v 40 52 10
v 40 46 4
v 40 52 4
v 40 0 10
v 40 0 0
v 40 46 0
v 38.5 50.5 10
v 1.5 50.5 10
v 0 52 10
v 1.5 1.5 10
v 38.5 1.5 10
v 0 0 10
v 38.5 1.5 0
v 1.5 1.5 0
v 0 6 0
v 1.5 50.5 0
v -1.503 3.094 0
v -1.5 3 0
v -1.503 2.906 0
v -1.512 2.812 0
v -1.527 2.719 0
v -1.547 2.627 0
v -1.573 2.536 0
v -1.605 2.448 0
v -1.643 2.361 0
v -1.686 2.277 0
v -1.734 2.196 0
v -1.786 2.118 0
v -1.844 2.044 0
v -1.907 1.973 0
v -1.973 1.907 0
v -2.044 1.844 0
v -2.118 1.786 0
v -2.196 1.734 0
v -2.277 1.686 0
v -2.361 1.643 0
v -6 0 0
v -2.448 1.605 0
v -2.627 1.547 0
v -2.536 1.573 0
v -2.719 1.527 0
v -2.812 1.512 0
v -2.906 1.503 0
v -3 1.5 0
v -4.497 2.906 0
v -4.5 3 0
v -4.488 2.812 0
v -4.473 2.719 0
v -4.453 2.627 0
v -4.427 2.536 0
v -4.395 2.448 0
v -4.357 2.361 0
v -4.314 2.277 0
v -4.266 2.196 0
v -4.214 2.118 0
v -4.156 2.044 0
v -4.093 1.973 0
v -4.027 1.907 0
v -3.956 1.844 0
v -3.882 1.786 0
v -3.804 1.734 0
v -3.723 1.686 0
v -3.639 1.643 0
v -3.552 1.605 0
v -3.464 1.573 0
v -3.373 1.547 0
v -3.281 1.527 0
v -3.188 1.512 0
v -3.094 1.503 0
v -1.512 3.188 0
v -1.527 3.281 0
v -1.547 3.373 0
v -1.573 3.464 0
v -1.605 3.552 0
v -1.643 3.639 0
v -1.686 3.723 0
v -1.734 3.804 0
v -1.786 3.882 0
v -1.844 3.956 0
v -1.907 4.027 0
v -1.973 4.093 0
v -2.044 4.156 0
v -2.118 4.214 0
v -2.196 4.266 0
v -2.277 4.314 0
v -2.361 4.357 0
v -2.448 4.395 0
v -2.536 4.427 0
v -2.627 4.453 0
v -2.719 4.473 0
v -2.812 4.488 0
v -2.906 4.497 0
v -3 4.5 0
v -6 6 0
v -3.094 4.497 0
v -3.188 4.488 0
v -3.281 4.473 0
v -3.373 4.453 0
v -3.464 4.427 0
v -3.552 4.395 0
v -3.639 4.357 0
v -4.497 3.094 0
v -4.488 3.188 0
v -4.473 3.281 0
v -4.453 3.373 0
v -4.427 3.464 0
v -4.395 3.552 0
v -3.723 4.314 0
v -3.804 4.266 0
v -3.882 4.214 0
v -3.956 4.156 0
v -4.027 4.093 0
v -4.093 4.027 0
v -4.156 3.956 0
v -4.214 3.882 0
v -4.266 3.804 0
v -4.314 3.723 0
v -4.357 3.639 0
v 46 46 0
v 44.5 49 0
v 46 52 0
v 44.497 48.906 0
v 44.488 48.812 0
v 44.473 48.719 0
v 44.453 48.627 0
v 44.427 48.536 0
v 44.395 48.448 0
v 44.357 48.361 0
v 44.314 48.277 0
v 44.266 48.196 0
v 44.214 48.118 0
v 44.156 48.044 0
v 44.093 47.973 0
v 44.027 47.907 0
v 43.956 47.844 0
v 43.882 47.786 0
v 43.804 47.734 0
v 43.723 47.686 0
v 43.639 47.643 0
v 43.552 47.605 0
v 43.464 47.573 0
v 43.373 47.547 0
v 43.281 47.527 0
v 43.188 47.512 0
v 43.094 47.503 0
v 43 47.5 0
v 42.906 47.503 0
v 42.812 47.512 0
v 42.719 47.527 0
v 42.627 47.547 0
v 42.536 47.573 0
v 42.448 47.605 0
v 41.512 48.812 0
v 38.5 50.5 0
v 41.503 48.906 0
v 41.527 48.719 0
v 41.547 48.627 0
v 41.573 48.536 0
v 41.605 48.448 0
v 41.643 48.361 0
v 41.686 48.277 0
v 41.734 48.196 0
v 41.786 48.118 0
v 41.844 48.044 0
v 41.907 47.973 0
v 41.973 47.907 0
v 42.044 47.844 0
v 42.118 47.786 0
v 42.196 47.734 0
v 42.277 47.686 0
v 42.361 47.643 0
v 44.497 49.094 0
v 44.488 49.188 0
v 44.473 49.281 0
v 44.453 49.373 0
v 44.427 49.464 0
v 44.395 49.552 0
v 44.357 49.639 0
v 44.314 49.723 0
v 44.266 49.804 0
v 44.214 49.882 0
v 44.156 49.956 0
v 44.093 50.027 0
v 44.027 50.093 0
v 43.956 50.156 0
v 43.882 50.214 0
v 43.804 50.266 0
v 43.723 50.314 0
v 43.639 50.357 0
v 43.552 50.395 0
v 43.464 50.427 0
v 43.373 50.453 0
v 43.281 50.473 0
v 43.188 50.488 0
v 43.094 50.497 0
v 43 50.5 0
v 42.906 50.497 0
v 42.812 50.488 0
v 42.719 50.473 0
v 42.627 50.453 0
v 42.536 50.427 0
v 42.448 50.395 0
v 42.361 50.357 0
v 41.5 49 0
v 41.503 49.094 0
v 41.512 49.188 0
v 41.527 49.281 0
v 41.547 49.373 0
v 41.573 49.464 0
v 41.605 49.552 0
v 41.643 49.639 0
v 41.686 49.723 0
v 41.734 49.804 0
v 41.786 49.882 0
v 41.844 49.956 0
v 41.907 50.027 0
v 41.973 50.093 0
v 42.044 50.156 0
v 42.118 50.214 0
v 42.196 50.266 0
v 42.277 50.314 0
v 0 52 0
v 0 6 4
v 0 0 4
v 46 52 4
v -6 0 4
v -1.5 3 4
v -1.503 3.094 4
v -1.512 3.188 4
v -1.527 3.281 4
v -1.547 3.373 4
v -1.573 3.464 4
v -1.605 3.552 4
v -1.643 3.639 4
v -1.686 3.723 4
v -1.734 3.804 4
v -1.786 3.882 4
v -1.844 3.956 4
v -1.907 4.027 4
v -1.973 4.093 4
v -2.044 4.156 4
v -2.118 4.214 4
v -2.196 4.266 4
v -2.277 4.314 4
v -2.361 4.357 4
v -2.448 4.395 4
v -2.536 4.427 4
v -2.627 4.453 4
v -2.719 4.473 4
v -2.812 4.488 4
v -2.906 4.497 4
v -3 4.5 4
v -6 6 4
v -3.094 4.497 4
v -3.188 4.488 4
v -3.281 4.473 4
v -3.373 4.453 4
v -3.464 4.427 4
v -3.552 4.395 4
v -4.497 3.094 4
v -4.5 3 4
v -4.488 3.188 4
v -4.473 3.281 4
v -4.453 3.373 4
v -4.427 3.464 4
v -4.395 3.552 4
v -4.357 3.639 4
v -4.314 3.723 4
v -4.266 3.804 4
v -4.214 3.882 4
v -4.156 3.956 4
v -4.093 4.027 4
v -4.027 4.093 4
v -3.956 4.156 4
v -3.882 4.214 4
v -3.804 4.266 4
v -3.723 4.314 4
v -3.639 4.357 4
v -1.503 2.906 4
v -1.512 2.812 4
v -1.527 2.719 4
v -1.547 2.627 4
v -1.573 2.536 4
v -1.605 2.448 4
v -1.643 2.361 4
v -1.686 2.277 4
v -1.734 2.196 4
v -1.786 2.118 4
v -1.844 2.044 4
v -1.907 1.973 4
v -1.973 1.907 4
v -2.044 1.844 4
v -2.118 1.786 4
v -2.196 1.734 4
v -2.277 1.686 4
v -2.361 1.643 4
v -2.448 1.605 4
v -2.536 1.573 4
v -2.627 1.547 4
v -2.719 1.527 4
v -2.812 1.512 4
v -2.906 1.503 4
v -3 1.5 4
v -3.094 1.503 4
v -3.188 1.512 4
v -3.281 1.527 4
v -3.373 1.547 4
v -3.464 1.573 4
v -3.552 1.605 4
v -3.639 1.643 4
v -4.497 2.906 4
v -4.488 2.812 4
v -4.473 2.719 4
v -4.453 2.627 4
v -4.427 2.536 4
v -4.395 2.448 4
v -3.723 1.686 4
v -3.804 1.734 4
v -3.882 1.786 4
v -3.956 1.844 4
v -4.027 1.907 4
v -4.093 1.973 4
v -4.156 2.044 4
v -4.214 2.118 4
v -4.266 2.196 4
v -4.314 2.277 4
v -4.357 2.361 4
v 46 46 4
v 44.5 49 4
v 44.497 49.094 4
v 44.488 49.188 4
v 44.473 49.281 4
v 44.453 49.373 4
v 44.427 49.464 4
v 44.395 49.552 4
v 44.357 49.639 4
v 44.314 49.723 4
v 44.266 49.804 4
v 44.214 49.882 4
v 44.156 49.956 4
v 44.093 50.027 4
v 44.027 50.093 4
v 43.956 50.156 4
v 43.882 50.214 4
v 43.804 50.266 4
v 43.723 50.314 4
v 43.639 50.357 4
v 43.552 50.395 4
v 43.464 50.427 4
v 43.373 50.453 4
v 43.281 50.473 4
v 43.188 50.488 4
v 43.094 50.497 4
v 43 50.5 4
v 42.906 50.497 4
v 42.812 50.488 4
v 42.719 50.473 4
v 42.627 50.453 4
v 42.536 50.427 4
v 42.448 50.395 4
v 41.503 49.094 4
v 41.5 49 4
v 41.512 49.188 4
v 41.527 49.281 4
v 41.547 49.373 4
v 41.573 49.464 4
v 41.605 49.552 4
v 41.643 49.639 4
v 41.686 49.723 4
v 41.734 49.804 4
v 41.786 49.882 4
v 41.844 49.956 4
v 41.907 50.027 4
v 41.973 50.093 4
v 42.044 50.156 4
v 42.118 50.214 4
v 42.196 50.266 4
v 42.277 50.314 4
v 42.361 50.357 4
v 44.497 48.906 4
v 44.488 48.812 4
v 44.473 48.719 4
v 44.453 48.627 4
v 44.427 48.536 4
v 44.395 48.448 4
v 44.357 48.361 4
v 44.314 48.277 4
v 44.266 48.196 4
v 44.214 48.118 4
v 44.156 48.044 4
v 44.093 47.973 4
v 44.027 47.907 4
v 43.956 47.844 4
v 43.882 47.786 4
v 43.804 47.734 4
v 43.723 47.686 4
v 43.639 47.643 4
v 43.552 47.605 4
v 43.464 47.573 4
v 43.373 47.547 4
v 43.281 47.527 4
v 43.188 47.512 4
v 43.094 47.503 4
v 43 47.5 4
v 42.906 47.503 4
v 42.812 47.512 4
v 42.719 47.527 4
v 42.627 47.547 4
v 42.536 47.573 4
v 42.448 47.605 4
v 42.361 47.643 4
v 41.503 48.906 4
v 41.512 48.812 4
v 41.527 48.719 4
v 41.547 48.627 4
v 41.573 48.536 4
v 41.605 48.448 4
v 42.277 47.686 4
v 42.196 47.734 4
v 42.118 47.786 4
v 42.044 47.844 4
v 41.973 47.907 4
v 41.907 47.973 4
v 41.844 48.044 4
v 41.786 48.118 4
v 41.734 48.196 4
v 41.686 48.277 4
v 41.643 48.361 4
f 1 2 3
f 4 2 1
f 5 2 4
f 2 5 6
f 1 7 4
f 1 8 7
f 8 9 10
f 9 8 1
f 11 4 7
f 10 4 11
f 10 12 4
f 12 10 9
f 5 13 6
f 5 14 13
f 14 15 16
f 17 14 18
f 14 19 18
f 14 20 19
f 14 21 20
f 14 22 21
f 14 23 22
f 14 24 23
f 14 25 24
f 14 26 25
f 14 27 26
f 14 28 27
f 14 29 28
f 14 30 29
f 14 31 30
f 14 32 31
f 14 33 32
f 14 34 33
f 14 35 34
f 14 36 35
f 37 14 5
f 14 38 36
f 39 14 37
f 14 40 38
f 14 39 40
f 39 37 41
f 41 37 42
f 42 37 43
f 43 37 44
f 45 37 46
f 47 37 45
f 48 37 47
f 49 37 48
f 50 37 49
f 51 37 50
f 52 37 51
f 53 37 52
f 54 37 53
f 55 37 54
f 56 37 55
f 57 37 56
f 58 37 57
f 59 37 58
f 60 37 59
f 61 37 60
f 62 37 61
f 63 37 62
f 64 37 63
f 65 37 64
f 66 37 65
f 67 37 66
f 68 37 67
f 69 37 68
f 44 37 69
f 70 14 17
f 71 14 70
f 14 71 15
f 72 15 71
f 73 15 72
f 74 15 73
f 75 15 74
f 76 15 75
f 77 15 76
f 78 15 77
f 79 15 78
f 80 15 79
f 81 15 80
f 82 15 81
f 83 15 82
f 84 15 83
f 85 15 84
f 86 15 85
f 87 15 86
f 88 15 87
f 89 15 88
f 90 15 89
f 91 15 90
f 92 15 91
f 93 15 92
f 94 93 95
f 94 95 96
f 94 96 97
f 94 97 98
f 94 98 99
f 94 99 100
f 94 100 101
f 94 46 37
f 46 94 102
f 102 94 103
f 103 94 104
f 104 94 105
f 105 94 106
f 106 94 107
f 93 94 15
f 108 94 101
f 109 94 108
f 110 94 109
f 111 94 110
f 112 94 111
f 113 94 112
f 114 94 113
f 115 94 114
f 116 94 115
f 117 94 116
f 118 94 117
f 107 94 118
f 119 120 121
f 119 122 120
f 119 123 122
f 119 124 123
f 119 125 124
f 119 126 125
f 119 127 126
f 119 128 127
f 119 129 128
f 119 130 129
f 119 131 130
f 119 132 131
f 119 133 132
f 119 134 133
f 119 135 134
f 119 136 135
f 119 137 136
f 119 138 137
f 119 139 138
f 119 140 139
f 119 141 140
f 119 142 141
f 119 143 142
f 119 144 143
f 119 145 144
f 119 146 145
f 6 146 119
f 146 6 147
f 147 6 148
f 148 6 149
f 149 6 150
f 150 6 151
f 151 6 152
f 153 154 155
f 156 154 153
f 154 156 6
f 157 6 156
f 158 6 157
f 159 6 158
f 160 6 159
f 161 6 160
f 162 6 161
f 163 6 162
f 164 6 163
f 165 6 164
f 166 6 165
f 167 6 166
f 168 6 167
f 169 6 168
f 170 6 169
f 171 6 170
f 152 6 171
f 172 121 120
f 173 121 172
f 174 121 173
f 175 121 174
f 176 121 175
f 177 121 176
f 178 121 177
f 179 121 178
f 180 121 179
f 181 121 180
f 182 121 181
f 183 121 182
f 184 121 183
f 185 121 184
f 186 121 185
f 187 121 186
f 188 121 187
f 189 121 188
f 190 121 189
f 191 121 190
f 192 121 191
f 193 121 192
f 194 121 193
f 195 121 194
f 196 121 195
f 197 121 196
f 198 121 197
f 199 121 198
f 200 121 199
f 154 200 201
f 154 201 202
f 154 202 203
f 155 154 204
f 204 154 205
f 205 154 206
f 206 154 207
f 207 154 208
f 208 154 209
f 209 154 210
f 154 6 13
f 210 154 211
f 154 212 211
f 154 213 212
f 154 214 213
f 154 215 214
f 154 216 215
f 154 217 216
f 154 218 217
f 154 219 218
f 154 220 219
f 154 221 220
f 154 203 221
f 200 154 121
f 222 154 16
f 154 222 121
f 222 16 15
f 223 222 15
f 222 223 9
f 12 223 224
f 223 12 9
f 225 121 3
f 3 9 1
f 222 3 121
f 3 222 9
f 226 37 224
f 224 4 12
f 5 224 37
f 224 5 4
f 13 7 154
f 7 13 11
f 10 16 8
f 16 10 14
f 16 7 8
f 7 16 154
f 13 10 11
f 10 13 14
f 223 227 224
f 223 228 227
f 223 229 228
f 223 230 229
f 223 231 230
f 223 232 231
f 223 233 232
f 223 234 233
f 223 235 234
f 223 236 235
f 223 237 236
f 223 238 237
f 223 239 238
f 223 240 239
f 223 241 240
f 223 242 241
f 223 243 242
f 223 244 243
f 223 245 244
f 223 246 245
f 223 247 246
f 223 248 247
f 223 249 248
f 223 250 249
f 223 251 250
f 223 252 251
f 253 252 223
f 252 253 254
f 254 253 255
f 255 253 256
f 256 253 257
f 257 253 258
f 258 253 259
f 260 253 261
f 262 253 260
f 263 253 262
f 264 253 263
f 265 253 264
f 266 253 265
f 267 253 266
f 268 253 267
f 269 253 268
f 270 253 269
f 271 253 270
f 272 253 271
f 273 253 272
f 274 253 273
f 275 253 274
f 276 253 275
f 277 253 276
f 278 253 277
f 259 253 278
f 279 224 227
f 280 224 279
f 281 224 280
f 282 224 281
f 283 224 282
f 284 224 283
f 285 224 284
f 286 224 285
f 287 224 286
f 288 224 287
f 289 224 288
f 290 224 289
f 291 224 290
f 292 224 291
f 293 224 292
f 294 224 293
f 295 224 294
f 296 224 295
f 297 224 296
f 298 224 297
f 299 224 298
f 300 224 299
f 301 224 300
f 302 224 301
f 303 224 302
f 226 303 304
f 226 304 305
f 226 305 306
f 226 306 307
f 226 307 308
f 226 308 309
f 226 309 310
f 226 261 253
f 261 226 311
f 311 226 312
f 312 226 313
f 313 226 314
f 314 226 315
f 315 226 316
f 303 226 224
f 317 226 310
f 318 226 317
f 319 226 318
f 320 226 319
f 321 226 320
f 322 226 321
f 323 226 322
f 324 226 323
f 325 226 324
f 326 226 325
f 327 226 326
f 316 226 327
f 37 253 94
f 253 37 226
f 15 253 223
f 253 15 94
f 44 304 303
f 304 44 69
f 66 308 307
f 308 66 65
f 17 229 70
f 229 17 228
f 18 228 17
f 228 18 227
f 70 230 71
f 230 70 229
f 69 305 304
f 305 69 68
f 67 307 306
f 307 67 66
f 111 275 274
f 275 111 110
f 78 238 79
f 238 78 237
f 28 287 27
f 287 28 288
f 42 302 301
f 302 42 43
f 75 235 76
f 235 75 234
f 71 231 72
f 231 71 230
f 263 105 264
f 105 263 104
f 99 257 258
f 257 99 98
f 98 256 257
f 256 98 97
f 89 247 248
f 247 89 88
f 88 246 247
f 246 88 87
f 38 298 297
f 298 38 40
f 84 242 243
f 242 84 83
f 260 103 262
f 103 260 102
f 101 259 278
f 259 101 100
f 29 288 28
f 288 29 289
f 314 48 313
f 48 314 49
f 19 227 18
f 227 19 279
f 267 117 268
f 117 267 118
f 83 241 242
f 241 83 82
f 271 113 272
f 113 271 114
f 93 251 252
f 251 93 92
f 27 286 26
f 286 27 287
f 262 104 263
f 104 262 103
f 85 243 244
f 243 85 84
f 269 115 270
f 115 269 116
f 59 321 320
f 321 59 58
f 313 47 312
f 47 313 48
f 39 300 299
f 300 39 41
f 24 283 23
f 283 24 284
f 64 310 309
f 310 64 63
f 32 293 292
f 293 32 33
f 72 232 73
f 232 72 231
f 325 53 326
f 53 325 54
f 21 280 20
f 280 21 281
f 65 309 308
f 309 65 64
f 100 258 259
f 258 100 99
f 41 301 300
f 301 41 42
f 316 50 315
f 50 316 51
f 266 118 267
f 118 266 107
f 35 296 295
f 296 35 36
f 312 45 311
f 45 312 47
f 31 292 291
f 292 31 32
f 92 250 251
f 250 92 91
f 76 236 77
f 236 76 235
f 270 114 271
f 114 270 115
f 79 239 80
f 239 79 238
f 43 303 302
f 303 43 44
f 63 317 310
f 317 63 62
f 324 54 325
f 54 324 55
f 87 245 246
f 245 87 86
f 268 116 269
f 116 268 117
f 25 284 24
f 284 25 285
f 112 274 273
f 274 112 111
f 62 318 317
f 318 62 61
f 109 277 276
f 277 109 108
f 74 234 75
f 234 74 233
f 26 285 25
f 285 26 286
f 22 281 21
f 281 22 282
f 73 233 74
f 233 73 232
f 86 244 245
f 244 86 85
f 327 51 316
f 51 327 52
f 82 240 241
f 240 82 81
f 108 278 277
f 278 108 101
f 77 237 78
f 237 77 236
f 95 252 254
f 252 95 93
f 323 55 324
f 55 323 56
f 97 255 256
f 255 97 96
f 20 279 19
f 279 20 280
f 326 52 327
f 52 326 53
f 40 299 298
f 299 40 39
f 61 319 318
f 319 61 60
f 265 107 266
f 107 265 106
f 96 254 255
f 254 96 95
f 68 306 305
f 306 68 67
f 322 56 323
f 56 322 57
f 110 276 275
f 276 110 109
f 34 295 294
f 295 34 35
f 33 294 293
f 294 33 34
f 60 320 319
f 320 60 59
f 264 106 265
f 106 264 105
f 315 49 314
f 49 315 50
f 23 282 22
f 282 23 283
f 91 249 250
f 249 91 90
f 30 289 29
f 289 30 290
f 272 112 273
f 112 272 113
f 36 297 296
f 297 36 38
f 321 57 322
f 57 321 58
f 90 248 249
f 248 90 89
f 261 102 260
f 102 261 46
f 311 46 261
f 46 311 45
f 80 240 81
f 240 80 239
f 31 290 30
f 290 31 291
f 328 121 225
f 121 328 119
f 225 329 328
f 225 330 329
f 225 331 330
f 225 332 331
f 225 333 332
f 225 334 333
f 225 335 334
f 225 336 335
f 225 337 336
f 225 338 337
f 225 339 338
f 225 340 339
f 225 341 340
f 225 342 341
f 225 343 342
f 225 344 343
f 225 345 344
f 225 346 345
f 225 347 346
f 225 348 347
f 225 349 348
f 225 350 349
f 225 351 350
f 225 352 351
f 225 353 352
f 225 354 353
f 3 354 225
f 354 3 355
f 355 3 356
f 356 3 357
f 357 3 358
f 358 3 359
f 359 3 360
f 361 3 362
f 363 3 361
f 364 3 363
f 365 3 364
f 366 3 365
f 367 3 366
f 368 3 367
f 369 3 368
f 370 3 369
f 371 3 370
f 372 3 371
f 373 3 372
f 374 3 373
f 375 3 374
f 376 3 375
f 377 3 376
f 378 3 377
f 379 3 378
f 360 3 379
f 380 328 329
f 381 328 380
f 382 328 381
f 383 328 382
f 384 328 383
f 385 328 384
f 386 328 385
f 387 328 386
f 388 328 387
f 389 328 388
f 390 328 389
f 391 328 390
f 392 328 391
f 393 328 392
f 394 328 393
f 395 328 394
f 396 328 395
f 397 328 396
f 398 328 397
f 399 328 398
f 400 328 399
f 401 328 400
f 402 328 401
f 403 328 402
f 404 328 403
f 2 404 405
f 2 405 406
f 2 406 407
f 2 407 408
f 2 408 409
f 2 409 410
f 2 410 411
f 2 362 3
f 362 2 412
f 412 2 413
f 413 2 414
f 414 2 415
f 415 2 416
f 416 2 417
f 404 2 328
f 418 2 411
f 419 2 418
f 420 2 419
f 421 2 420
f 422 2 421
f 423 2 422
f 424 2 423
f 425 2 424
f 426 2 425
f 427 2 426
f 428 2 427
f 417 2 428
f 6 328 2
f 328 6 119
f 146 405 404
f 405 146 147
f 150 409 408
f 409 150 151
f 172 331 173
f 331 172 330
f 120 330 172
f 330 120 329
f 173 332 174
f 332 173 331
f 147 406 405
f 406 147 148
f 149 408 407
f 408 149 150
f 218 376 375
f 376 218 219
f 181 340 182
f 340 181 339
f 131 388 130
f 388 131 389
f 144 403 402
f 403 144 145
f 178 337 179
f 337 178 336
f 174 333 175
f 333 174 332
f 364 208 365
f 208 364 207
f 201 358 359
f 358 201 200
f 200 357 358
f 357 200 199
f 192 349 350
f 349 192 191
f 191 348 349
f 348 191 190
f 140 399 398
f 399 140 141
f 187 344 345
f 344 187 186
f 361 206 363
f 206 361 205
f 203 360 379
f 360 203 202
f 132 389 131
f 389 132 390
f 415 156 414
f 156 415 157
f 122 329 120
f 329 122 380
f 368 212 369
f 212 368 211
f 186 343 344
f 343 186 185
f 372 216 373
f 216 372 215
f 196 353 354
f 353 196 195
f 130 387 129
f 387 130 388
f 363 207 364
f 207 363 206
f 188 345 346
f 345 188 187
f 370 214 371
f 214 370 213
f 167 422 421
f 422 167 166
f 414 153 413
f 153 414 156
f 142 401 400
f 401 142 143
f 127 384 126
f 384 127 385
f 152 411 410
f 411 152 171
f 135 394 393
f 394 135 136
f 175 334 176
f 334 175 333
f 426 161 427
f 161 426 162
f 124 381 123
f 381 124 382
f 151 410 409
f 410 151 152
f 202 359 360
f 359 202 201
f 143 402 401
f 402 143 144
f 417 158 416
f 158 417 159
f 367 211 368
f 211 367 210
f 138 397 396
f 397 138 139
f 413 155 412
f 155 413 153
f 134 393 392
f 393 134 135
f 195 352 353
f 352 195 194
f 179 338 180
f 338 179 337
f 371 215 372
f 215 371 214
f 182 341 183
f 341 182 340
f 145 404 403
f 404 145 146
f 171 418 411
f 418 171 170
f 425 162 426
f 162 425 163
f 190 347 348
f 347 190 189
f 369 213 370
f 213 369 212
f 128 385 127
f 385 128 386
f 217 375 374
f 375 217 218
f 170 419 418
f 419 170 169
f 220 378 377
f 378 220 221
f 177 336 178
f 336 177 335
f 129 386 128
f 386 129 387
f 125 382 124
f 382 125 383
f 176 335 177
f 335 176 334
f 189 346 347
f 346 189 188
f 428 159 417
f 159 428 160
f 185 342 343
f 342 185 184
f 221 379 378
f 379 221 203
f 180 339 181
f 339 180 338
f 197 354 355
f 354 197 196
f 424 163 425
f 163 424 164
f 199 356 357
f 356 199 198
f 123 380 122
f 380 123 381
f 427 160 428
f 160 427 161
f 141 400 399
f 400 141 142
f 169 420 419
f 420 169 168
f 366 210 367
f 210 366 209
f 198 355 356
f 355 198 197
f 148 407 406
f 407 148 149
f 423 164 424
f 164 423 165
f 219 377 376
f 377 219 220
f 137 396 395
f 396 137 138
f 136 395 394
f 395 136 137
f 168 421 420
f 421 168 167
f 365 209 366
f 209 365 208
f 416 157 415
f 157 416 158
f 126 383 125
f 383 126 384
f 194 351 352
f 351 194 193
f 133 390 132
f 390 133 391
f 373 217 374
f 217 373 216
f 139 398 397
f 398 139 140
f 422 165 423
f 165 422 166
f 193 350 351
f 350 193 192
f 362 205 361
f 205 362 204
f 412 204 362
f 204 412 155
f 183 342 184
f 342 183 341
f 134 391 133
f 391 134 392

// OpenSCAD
$fn=100;

difference(){
union (){
  cube([40,52,10]);
}
translate ([1.5,1.5,0]){
cube([37,49,10]);
}
}


translate ([-6,0,0]) {
  difference () {
    cube([6,6,4]);
    translate ([3,3,0]) {
      cylinder (r=1.5,h=5);
    }
  }
}

translate ([40,52-6,0]) {
  difference () {
    cube([6,6,4]);
    translate ([3,3,0]) {
      cylinder (r=1.5,h=5);
    }
  }
}
